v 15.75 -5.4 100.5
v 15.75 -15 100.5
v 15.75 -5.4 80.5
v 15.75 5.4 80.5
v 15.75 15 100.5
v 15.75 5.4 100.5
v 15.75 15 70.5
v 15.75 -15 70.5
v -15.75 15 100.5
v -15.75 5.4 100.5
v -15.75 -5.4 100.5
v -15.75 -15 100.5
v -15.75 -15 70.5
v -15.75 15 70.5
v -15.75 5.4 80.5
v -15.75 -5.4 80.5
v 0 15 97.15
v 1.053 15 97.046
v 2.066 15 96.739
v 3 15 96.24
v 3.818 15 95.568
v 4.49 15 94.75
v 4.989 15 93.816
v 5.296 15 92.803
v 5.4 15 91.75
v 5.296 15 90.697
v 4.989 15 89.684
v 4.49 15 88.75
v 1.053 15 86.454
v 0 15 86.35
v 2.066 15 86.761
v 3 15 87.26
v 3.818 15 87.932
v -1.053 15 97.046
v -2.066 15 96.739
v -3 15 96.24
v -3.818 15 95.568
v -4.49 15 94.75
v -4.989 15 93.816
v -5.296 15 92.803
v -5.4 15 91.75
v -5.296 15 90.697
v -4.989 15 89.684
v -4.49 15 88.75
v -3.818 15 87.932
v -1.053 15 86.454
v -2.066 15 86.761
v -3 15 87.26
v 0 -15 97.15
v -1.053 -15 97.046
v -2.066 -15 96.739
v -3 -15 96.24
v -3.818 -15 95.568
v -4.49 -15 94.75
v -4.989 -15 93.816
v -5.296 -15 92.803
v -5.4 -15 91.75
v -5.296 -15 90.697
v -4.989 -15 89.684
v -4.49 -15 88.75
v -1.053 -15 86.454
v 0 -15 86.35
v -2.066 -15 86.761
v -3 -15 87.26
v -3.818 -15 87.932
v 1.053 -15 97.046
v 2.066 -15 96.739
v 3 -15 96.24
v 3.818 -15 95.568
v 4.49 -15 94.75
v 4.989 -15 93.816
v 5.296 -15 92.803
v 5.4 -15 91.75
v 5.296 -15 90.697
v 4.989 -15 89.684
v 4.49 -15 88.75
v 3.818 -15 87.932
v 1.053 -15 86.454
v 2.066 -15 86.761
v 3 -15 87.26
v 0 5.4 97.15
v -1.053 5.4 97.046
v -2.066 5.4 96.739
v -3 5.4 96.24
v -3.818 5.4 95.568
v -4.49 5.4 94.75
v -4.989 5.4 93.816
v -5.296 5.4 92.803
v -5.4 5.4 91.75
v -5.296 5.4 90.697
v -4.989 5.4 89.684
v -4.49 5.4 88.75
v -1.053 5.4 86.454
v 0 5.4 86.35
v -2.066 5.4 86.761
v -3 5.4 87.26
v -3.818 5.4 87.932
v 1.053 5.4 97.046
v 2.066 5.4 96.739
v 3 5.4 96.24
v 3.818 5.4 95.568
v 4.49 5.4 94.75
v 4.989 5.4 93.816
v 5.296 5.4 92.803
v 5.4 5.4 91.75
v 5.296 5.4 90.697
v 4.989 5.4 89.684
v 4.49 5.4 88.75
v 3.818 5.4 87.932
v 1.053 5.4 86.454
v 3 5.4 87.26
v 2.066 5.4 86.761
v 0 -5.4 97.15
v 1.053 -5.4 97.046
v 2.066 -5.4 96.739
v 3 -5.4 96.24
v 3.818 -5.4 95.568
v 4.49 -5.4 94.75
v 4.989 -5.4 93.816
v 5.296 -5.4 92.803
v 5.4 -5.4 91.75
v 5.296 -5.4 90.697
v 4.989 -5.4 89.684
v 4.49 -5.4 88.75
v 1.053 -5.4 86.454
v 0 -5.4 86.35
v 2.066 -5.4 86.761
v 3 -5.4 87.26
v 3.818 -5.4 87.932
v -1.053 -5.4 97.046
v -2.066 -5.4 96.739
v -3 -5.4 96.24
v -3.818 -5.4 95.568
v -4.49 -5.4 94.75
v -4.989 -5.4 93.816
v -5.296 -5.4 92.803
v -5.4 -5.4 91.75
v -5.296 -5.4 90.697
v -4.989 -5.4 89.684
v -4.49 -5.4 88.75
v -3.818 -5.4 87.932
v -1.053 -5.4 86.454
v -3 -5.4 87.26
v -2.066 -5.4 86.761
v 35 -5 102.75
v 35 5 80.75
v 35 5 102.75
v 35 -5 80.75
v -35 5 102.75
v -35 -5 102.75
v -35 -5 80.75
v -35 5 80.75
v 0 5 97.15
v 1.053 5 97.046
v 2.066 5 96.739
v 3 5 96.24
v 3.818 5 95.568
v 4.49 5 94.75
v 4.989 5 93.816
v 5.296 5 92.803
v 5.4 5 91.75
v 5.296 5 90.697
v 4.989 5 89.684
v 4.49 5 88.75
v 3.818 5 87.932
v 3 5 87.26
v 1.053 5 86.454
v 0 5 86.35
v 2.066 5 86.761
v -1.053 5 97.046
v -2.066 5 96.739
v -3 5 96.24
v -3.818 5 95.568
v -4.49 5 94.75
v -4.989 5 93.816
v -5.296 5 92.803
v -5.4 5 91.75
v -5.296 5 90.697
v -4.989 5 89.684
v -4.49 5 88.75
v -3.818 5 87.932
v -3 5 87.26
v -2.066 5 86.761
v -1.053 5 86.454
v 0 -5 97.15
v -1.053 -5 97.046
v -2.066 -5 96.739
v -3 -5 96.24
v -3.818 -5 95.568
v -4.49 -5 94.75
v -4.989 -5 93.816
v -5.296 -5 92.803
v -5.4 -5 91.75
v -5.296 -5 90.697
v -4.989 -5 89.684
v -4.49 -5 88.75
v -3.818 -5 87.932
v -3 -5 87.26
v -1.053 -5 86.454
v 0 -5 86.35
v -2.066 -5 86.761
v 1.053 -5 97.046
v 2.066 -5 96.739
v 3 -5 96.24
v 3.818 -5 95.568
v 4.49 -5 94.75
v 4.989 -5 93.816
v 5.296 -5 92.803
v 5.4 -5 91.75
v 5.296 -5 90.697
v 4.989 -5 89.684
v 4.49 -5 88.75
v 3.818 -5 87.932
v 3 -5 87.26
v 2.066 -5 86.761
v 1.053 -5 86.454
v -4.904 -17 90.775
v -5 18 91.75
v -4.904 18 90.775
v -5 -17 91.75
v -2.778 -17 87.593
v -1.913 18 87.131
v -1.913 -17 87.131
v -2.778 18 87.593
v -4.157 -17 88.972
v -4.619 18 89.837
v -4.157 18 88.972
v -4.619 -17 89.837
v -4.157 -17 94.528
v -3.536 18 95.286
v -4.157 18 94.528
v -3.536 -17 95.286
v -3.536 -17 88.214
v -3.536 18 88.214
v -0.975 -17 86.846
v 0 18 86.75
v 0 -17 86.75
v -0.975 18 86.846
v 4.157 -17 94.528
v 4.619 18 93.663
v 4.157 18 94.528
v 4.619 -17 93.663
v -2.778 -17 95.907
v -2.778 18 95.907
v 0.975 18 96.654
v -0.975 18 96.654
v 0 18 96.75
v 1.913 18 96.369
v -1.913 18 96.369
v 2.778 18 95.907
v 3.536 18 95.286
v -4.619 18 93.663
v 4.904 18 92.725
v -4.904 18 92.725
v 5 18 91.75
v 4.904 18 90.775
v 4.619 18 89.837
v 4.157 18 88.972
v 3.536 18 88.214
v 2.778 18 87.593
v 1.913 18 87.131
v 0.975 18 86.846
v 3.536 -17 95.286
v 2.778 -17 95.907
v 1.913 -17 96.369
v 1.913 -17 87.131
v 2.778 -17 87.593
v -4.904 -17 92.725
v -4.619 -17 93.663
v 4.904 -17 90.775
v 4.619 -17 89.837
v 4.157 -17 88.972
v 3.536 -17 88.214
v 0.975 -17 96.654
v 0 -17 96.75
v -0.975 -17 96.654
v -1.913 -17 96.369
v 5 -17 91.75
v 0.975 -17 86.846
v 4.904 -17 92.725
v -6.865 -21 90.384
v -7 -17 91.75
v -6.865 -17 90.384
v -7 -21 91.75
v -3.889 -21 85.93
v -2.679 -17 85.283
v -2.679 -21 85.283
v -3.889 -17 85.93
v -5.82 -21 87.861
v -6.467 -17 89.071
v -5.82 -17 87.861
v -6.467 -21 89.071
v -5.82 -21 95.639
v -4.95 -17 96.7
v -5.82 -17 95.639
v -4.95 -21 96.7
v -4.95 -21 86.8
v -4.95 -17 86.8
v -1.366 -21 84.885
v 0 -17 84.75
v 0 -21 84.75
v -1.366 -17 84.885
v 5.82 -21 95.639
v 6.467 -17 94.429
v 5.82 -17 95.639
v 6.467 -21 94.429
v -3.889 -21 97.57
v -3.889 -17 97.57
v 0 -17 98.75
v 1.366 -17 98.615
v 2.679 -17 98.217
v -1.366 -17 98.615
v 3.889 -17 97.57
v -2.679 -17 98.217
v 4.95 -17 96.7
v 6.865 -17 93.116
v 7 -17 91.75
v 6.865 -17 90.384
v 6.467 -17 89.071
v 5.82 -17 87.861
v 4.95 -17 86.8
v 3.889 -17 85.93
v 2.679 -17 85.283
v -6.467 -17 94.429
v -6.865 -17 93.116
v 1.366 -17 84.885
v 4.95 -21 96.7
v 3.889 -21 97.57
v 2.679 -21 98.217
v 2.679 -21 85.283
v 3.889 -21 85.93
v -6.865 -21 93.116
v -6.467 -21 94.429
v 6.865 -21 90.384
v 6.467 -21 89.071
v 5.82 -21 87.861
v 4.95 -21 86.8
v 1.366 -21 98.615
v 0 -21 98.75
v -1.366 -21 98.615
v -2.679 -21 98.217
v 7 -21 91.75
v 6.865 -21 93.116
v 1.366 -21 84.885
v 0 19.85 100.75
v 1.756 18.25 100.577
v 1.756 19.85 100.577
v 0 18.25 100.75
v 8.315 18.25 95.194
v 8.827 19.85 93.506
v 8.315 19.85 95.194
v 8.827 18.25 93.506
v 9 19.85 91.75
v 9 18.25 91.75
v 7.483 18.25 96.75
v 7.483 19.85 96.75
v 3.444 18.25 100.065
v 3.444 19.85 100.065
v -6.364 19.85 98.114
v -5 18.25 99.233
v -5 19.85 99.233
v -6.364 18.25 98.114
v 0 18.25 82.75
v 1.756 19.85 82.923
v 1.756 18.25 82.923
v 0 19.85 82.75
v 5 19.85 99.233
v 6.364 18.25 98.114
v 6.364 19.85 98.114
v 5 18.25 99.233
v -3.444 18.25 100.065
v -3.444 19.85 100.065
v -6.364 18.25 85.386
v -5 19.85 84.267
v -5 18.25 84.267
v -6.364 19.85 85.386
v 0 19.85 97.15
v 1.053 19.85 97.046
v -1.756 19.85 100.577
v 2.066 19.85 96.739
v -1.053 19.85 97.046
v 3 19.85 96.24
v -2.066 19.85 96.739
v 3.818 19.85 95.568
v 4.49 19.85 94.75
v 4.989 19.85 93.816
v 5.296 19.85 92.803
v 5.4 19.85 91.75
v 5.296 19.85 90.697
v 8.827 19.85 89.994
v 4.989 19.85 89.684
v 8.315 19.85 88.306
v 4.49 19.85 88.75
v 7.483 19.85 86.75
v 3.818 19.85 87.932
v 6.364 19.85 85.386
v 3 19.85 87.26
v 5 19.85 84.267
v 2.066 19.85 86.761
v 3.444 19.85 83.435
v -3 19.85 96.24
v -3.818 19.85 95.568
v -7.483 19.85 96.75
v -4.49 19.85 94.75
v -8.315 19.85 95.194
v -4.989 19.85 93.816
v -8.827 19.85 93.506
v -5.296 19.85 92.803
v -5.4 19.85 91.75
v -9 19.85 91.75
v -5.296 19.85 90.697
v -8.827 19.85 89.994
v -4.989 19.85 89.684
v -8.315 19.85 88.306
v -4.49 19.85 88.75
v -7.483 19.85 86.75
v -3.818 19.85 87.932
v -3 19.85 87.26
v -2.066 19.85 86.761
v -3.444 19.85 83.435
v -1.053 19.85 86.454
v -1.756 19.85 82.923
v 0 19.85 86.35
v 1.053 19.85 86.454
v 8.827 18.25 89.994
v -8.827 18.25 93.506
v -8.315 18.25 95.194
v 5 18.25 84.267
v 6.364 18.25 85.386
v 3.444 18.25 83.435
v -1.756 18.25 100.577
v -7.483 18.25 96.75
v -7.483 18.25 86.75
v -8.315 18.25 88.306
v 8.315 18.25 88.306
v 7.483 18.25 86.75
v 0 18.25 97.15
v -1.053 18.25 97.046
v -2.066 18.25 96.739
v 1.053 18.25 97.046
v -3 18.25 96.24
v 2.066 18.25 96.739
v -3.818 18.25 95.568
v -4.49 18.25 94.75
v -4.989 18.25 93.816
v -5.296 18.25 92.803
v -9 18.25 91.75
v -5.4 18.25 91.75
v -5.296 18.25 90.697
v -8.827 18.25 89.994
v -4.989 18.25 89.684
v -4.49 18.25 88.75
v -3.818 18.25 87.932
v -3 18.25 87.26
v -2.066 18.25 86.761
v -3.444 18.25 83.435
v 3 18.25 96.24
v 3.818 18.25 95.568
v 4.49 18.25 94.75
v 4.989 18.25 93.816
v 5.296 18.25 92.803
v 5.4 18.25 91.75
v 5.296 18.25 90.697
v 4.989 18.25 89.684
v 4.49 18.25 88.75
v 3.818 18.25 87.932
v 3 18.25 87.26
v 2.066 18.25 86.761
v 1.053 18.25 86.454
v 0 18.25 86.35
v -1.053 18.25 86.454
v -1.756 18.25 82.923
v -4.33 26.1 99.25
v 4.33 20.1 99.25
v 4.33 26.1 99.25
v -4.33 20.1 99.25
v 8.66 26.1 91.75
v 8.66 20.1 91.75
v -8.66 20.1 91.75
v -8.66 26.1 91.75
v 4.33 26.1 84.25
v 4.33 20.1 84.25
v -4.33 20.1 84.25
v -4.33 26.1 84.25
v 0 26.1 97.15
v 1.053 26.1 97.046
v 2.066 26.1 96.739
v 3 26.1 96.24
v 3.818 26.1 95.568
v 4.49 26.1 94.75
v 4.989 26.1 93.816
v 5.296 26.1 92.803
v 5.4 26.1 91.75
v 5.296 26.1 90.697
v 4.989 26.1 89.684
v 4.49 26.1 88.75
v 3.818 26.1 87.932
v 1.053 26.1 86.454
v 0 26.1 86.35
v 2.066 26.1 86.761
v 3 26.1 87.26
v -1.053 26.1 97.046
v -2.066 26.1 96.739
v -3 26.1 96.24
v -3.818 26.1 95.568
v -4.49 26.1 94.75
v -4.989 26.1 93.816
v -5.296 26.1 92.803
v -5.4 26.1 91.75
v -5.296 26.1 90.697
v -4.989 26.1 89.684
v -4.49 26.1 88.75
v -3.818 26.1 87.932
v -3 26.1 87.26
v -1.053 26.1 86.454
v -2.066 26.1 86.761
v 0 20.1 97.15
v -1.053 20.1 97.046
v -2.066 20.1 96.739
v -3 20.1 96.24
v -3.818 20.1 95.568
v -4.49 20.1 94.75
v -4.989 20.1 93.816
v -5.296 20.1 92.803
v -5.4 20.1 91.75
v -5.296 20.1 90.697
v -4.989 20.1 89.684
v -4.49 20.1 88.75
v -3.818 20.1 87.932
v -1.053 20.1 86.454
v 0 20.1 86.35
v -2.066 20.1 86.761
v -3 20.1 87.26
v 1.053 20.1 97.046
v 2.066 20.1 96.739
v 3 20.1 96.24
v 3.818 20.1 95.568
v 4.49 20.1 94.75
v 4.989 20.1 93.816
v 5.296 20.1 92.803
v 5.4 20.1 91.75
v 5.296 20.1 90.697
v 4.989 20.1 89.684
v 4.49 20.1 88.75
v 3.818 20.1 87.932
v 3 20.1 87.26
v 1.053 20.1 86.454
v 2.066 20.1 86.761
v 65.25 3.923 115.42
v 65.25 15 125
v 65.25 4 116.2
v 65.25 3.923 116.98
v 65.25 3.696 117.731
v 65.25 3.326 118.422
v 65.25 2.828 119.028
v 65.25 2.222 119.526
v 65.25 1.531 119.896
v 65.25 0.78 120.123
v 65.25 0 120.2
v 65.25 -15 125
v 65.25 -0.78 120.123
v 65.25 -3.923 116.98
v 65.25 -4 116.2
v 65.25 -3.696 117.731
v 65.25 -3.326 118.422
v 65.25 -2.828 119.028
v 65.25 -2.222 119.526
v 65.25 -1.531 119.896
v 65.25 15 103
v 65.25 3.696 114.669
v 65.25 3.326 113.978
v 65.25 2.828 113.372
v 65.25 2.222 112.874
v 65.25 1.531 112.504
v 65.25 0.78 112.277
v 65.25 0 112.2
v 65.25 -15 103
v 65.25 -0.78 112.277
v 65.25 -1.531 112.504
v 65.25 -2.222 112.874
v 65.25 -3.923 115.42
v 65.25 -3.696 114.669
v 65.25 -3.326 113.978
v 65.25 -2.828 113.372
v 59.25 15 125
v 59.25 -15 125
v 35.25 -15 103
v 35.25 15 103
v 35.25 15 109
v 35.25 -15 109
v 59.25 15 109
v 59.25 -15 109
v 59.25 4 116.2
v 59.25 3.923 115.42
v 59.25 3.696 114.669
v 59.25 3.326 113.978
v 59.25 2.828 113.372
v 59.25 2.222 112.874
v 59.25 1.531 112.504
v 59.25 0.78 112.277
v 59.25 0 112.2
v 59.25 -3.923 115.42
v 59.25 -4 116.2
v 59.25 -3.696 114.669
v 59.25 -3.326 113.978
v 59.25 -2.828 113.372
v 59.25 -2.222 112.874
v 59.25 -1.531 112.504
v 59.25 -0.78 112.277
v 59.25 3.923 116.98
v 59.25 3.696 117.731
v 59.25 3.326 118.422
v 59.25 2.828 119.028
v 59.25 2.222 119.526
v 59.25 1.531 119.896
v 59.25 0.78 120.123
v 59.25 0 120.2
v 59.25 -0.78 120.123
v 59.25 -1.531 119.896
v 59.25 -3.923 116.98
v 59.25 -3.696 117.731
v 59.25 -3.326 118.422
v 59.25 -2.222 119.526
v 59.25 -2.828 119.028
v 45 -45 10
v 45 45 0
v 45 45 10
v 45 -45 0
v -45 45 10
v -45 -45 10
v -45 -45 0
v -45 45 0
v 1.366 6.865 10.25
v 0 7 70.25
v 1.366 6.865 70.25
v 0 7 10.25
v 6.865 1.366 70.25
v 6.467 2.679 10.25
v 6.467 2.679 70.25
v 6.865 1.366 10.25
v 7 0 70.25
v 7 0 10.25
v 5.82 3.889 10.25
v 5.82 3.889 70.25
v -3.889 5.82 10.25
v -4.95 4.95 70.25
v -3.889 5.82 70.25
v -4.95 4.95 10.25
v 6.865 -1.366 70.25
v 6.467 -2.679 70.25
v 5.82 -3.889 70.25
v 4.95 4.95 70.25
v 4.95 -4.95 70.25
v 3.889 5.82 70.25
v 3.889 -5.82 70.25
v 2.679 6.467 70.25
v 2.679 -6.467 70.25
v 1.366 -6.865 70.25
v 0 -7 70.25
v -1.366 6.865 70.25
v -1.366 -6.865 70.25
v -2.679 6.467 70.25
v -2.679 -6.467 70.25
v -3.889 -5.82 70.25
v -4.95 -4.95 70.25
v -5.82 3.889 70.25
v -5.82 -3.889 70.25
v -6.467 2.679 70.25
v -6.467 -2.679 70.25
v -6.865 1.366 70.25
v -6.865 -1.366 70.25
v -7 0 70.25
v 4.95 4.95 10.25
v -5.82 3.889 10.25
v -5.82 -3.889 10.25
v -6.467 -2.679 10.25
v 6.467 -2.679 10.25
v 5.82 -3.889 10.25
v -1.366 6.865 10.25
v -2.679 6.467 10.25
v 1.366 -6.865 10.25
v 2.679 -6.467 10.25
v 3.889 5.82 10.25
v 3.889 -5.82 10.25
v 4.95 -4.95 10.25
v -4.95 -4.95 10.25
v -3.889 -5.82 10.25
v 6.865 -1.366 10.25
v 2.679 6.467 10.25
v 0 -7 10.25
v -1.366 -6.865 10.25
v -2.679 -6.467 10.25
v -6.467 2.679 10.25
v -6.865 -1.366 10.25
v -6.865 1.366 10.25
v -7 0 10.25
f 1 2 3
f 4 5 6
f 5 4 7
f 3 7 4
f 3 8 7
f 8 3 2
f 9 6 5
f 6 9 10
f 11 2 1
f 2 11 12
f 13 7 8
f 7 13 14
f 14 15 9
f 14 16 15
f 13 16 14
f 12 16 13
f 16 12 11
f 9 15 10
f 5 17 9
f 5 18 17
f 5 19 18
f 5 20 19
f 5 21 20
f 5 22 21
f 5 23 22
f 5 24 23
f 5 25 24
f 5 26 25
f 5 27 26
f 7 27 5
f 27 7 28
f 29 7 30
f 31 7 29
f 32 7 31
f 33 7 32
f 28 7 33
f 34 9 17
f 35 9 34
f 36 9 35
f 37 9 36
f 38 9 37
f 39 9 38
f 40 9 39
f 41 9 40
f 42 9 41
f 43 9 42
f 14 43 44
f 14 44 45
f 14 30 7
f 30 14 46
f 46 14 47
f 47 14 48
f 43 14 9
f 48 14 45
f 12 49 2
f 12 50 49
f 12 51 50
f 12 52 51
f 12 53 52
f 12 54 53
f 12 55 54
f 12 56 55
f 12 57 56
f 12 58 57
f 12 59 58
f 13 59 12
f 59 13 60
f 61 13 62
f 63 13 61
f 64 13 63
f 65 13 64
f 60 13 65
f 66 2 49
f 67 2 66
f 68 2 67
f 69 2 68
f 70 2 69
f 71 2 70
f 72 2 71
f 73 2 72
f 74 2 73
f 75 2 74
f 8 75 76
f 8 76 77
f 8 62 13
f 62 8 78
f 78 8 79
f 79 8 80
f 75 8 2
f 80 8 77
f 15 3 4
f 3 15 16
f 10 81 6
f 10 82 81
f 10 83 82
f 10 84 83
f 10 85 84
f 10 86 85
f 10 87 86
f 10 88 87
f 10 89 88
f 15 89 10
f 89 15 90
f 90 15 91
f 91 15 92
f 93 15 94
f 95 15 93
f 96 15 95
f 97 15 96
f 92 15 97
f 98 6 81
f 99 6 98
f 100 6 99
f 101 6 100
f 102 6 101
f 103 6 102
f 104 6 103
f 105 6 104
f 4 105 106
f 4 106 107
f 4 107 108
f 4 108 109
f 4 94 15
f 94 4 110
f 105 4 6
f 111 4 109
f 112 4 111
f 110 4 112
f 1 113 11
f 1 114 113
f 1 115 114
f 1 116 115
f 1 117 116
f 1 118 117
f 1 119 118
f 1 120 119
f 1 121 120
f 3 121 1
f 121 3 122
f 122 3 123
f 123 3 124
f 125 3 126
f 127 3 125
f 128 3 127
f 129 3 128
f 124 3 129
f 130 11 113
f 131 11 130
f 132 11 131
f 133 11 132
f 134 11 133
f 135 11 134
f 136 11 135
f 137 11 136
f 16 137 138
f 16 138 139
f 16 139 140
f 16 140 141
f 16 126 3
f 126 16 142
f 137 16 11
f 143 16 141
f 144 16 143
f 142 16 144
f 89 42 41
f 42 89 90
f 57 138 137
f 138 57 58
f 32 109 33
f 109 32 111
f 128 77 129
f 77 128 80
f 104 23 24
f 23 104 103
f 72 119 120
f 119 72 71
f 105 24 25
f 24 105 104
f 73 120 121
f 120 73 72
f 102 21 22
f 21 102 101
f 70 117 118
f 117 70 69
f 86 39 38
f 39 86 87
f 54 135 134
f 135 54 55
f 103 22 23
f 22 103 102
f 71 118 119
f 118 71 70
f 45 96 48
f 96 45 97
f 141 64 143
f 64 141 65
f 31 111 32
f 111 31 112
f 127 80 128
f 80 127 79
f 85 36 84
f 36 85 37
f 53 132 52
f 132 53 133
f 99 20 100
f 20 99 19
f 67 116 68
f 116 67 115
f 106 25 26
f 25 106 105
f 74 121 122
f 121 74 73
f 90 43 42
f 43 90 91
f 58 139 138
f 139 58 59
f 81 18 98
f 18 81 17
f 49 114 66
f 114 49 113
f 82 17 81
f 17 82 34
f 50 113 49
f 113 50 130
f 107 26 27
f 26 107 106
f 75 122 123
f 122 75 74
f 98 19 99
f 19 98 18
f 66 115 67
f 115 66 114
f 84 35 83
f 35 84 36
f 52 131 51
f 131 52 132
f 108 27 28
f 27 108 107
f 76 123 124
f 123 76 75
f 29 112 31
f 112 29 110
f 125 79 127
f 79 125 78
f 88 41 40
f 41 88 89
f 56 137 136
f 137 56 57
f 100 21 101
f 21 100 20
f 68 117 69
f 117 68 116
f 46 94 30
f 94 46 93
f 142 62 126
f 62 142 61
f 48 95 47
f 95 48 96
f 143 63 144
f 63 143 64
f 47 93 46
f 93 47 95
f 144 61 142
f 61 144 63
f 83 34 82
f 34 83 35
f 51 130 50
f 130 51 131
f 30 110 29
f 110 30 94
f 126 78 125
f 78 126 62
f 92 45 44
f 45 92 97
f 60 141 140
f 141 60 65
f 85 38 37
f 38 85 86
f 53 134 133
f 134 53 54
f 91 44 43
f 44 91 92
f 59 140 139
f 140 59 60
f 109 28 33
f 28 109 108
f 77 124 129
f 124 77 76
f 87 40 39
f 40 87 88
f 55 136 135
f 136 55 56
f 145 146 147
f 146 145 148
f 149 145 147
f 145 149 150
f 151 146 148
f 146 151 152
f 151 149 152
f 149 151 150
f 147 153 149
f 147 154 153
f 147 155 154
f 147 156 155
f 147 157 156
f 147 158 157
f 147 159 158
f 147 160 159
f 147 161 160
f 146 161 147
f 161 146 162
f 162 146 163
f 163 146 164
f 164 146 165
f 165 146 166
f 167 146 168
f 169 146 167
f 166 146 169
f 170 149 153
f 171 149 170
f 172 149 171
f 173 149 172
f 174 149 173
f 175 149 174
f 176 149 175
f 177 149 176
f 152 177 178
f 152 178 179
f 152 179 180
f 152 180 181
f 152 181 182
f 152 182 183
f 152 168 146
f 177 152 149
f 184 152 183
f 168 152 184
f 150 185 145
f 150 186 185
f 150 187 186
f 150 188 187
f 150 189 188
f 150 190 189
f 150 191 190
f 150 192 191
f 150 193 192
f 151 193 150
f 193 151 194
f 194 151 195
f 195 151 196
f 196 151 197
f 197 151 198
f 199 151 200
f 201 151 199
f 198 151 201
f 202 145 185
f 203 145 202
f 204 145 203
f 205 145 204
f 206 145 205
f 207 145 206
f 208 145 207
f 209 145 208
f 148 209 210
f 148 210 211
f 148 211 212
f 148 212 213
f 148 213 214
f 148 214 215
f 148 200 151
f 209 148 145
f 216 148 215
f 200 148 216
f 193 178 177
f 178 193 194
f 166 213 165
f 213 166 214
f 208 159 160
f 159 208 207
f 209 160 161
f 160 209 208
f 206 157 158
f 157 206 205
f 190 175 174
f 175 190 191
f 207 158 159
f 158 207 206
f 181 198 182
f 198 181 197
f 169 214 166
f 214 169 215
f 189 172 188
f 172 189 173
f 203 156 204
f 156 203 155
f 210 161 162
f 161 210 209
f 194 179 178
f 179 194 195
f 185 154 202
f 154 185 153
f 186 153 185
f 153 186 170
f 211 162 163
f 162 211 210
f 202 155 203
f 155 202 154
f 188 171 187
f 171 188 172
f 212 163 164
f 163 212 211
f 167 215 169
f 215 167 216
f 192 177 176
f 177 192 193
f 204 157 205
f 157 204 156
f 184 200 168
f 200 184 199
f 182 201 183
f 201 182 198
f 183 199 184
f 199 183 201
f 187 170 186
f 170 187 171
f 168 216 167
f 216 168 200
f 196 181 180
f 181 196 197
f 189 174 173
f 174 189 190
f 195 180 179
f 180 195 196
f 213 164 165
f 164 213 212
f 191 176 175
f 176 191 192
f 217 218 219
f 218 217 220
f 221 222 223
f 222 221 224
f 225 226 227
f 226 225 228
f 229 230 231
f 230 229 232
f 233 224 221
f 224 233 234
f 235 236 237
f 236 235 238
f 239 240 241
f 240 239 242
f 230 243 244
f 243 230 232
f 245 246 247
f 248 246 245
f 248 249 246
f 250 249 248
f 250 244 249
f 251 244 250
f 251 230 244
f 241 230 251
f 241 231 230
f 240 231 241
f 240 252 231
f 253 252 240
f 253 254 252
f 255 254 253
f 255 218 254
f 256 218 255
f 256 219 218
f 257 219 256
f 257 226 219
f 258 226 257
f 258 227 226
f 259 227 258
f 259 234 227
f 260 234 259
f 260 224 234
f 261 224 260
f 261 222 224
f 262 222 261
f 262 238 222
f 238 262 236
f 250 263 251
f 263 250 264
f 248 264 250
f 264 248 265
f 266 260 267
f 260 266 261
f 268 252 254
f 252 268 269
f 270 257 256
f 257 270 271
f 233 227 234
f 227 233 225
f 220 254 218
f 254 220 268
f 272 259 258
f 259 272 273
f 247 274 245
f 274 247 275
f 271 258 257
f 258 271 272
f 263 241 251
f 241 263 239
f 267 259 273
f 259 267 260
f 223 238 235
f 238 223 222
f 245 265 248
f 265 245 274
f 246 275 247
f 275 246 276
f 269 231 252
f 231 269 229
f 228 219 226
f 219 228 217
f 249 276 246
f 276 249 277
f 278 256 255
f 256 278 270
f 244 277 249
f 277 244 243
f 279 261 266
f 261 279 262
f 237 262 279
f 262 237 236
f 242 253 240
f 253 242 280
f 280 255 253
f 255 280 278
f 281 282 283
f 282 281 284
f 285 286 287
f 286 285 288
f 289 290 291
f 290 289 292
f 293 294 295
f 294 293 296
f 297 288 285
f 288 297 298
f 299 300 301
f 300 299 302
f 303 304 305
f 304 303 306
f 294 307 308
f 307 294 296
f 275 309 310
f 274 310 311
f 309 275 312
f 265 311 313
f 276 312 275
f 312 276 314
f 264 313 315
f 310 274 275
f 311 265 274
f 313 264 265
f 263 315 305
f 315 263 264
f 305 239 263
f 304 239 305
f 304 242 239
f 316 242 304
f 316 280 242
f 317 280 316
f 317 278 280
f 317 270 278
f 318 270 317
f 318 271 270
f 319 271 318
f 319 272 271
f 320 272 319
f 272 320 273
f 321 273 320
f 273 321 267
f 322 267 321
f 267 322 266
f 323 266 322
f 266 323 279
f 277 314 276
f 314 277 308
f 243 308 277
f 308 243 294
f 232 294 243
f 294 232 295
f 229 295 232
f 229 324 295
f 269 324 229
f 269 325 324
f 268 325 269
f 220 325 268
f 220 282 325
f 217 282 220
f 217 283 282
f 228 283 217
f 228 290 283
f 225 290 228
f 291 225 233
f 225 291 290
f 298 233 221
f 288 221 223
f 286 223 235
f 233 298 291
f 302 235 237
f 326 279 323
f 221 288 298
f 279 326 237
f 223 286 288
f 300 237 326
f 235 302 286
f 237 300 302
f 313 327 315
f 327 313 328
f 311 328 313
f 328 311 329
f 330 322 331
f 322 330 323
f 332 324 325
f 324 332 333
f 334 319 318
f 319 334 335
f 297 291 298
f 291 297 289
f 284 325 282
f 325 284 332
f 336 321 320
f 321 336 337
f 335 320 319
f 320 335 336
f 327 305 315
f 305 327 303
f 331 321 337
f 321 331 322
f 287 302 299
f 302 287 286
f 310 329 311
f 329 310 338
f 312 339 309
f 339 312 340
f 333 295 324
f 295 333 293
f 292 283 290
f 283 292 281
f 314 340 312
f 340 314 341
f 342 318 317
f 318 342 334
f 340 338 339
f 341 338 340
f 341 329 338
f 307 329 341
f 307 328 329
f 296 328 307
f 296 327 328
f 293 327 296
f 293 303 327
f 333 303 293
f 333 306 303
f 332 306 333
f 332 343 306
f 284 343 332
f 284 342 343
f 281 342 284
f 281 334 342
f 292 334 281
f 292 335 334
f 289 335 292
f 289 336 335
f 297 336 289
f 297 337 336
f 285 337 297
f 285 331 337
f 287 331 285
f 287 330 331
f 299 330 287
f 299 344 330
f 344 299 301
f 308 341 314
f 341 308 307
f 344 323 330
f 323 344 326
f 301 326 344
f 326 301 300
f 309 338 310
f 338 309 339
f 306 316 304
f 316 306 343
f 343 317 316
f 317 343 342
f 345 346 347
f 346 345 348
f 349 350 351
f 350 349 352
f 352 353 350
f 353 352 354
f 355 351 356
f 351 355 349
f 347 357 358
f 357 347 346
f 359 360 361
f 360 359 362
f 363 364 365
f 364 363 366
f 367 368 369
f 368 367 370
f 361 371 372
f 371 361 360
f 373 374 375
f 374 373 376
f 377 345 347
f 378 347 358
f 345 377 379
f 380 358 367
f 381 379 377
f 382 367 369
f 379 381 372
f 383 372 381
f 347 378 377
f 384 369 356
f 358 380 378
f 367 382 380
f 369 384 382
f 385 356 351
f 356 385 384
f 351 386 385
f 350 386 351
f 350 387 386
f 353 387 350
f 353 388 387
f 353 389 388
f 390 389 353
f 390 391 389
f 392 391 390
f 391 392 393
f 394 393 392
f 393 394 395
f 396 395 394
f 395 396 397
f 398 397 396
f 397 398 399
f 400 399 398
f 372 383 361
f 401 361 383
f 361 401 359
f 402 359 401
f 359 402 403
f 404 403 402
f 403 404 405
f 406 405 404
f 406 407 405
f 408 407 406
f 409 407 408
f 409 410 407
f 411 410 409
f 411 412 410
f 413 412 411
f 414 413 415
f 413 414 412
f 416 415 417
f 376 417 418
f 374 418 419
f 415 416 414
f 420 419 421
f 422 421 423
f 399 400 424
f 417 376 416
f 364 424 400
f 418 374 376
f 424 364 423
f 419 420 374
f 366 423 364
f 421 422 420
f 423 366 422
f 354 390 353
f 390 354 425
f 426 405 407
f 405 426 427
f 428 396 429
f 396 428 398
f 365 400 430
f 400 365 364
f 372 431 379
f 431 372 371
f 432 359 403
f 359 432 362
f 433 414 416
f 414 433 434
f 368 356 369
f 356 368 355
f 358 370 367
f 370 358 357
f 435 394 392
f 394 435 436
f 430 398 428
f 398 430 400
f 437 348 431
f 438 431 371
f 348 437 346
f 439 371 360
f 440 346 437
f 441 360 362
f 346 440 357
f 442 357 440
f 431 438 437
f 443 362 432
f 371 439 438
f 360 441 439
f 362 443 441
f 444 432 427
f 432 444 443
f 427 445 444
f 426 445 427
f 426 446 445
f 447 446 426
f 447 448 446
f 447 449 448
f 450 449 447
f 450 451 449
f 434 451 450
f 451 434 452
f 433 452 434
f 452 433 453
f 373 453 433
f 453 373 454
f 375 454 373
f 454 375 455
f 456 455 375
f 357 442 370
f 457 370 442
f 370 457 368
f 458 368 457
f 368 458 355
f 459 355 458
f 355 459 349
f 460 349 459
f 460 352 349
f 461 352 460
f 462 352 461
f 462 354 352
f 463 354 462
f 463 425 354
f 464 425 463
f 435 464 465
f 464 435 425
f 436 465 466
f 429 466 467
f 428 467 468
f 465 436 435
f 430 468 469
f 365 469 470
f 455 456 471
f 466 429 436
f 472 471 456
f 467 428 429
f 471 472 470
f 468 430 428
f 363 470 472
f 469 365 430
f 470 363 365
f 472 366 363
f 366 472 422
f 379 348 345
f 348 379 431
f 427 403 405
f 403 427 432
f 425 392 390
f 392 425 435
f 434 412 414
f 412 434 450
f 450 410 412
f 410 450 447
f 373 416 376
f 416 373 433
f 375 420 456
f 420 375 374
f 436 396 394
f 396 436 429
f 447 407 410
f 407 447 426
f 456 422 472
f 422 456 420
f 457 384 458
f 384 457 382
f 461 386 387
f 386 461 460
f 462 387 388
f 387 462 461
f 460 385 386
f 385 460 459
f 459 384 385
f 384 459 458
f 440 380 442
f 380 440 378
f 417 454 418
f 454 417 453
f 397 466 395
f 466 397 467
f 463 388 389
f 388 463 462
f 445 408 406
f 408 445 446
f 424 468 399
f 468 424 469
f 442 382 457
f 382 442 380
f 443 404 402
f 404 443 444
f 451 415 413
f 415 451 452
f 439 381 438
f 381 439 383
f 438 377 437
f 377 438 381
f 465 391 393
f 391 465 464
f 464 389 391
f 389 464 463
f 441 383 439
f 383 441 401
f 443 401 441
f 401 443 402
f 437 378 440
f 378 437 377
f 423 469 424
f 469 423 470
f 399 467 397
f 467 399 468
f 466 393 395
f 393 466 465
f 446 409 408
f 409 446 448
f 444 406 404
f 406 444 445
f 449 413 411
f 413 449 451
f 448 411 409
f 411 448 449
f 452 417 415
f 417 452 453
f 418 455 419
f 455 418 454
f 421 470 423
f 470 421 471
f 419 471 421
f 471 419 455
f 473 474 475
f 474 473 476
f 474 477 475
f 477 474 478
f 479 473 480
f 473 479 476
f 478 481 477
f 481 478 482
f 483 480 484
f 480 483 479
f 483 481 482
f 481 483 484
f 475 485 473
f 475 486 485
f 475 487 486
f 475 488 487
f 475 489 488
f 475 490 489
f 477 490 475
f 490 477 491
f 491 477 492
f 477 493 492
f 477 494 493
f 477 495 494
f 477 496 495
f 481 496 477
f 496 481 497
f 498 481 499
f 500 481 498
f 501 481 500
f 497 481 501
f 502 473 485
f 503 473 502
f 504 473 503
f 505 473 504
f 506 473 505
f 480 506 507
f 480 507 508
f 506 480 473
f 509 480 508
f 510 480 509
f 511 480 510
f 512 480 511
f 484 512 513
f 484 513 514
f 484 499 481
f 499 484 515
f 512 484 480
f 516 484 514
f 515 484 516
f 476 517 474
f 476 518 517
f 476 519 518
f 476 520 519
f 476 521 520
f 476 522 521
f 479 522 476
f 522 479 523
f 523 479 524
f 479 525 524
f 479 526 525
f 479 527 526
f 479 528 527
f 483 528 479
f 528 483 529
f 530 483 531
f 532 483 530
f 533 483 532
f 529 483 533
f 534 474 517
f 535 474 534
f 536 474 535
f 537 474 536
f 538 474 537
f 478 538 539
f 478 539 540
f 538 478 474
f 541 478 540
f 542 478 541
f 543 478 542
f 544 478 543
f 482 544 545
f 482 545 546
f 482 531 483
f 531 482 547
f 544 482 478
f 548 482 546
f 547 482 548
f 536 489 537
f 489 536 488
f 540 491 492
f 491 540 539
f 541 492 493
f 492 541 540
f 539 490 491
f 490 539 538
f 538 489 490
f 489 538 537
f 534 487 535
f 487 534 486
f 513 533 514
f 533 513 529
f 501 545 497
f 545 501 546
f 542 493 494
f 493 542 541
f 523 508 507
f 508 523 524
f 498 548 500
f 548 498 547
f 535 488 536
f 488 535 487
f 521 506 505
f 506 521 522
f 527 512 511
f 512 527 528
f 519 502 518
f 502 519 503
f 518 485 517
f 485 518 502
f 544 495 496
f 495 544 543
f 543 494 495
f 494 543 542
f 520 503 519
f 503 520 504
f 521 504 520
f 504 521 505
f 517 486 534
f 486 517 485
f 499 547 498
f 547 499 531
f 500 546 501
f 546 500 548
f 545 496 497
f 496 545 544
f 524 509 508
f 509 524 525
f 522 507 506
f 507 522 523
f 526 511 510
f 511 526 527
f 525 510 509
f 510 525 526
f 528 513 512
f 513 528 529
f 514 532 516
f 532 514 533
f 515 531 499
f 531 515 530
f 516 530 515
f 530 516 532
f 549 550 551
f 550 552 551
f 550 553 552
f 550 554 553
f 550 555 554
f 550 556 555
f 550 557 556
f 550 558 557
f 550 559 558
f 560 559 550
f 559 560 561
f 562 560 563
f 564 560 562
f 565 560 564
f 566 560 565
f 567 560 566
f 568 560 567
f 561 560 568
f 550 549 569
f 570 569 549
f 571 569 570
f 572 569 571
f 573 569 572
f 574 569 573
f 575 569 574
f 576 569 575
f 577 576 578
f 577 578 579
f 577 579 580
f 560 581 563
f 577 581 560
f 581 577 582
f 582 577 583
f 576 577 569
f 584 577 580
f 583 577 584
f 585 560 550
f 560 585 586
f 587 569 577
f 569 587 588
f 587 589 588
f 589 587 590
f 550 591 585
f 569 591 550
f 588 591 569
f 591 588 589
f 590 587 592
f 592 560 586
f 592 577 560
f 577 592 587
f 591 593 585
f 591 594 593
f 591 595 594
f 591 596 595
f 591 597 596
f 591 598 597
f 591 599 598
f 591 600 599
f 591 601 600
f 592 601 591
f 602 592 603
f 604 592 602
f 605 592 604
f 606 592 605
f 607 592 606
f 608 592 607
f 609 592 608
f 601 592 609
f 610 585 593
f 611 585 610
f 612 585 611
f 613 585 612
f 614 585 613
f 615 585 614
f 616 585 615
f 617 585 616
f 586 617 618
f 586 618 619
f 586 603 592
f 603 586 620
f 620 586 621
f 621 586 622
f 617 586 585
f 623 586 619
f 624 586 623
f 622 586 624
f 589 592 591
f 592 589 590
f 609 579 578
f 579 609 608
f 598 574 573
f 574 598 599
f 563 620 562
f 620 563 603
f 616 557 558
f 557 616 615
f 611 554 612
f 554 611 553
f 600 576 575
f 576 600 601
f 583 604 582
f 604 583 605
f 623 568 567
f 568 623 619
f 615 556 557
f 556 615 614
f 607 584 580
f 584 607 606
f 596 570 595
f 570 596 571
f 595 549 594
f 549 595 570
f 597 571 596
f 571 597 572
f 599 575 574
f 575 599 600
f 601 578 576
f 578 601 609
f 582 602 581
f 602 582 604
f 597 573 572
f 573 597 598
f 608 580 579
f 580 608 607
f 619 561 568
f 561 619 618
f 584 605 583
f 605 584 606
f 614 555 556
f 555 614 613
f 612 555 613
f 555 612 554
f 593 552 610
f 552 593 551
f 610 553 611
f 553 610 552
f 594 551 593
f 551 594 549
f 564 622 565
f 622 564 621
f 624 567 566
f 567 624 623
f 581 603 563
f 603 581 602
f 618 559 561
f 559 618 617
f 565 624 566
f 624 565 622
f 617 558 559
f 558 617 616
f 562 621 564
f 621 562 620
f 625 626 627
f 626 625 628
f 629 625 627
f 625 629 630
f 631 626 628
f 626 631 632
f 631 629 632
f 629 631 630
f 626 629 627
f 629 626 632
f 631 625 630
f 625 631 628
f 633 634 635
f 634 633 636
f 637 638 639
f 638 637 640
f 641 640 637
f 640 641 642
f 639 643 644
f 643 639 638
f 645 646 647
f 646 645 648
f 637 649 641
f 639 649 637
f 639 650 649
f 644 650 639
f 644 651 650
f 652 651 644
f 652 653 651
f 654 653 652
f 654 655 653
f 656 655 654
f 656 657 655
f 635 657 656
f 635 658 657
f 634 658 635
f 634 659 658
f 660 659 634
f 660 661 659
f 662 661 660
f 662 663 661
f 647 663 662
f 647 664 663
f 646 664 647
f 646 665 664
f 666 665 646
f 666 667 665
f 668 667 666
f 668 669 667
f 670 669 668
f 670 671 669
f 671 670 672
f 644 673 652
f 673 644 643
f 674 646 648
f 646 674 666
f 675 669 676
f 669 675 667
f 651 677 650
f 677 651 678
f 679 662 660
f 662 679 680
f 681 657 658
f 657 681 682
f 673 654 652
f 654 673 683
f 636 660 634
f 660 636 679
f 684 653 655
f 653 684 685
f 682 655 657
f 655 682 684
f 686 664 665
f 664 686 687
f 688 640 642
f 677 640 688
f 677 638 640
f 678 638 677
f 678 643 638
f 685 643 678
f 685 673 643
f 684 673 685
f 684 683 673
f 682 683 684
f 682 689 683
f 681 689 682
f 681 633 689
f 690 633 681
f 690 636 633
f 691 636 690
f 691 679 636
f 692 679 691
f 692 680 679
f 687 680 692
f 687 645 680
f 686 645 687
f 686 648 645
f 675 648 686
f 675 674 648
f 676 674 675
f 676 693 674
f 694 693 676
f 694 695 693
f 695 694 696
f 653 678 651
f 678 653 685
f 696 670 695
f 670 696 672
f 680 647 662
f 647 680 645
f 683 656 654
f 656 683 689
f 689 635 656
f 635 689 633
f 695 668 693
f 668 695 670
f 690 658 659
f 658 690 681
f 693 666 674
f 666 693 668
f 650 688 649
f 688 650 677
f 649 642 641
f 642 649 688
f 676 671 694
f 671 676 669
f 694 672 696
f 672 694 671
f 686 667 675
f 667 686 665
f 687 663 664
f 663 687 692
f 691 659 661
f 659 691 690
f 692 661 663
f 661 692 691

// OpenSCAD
$fn = 32;

// ------------------------------------------------------------------------
// Lamp arm: column d14 x 60 mm, arm 70 mm
// Every part is its own module, assembly() places every instance.
// ------------------------------------------------------------------------

// --- part 1 ---
module lamp_base() {
  difference() {
    translate([-45, -45, 0]) cube([90, 90, 10]);
  }
}

// --- part 2 ---
module lamp_column() {
  cylinder(h = 60, d = 14);
}

// --- part 3 ---
module head_fork() {
  difference() {
    translate([-15.75, -15, 0]) cube([31.5, 30, 30]);
    translate([-16.75, -5.4, 10]) cube([33.5, 10.8, 21]);
    translate([0, 0, 21.25]) rotate([90, 0, 0]) cylinder(h = 32, d = 10.8, center = true);
  }
}

// --- part 4 ---
module lamp_arm() {
  difference() {
    translate([-35, -5, 0]) cube([70, 10, 22]);
    translate([0, 0, 11]) rotate([90, 0, 0]) cylinder(h = 12, d = 10.8, center = true);
  }
}

// --- part 5 ---
module arm_pin() {
  rotate([0, 90, 0]) cylinder(h = 36, d = 10, center = true);
  translate([-21, 0, 0]) rotate([0, 90, 0]) cylinder(h = 4, d = 14);
}

// --- part 6 ---
module arm_washer() {
  difference() {
      translate([0, 0, 0]) cylinder(h = 1.6, d = 18);
      translate([0, 0, -1]) cylinder(h = 3.6, d = 10.8);
    }
}

// --- part 7 ---
module arm_nut() {
  difference() {
    linear_extrude(height = 6) polygon(points = [[8.66, 0], [4.33, 7.5], [-4.33, 7.5], [-8.66, 0], [-4.33, -7.5], [4.33, -7.5]]);
    translate([0, 0, -1]) cylinder(h = 8, d = 10.8);
  }
}

// --- part 8 ---
module shade_bracket() {
  difference() {
    translate([-15, -15, 0]) cube([30, 30, 22]);
    translate([-16, -16, 6]) cube([25, 32, 17]);
    translate([12, 0, 13.2]) rotate([0, 90, 0]) cylinder(h = 8, d = 8, center = true);
  }
}

// --- assembly ---
module assembly() {
  color([0.80, 0.24, 0.20]) translate([0, 0, 0]) rotate([0, 0, 0]) lamp_base();
  color([0.20, 0.45, 0.75]) translate([0, 0, 10.25]) rotate([0, 0, 0]) lamp_column();
  color([0.25, 0.62, 0.32]) translate([0, 0, 70.5]) rotate([0, 0, 0]) head_fork();
  color([0.92, 0.70, 0.18]) translate([0, 0, 80.75]) rotate([0, 0, 0]) lamp_arm();
  color([0.58, 0.35, 0.70]) translate([0, 0, 91.75]) rotate([0, 0, 90]) arm_pin();
  color([0.16, 0.66, 0.66]) translate([0, 19.85, 91.75]) rotate([90, 0, 0]) arm_washer();
  color([0.85, 0.48, 0.18]) translate([0, 26.1, 91.75]) rotate([90, 0, 0]) arm_nut();
  color([0.55, 0.60, 0.65]) translate([50.25, 0, 103]) rotate([0, 0, 0]) shade_bracket();
}

assembly();
